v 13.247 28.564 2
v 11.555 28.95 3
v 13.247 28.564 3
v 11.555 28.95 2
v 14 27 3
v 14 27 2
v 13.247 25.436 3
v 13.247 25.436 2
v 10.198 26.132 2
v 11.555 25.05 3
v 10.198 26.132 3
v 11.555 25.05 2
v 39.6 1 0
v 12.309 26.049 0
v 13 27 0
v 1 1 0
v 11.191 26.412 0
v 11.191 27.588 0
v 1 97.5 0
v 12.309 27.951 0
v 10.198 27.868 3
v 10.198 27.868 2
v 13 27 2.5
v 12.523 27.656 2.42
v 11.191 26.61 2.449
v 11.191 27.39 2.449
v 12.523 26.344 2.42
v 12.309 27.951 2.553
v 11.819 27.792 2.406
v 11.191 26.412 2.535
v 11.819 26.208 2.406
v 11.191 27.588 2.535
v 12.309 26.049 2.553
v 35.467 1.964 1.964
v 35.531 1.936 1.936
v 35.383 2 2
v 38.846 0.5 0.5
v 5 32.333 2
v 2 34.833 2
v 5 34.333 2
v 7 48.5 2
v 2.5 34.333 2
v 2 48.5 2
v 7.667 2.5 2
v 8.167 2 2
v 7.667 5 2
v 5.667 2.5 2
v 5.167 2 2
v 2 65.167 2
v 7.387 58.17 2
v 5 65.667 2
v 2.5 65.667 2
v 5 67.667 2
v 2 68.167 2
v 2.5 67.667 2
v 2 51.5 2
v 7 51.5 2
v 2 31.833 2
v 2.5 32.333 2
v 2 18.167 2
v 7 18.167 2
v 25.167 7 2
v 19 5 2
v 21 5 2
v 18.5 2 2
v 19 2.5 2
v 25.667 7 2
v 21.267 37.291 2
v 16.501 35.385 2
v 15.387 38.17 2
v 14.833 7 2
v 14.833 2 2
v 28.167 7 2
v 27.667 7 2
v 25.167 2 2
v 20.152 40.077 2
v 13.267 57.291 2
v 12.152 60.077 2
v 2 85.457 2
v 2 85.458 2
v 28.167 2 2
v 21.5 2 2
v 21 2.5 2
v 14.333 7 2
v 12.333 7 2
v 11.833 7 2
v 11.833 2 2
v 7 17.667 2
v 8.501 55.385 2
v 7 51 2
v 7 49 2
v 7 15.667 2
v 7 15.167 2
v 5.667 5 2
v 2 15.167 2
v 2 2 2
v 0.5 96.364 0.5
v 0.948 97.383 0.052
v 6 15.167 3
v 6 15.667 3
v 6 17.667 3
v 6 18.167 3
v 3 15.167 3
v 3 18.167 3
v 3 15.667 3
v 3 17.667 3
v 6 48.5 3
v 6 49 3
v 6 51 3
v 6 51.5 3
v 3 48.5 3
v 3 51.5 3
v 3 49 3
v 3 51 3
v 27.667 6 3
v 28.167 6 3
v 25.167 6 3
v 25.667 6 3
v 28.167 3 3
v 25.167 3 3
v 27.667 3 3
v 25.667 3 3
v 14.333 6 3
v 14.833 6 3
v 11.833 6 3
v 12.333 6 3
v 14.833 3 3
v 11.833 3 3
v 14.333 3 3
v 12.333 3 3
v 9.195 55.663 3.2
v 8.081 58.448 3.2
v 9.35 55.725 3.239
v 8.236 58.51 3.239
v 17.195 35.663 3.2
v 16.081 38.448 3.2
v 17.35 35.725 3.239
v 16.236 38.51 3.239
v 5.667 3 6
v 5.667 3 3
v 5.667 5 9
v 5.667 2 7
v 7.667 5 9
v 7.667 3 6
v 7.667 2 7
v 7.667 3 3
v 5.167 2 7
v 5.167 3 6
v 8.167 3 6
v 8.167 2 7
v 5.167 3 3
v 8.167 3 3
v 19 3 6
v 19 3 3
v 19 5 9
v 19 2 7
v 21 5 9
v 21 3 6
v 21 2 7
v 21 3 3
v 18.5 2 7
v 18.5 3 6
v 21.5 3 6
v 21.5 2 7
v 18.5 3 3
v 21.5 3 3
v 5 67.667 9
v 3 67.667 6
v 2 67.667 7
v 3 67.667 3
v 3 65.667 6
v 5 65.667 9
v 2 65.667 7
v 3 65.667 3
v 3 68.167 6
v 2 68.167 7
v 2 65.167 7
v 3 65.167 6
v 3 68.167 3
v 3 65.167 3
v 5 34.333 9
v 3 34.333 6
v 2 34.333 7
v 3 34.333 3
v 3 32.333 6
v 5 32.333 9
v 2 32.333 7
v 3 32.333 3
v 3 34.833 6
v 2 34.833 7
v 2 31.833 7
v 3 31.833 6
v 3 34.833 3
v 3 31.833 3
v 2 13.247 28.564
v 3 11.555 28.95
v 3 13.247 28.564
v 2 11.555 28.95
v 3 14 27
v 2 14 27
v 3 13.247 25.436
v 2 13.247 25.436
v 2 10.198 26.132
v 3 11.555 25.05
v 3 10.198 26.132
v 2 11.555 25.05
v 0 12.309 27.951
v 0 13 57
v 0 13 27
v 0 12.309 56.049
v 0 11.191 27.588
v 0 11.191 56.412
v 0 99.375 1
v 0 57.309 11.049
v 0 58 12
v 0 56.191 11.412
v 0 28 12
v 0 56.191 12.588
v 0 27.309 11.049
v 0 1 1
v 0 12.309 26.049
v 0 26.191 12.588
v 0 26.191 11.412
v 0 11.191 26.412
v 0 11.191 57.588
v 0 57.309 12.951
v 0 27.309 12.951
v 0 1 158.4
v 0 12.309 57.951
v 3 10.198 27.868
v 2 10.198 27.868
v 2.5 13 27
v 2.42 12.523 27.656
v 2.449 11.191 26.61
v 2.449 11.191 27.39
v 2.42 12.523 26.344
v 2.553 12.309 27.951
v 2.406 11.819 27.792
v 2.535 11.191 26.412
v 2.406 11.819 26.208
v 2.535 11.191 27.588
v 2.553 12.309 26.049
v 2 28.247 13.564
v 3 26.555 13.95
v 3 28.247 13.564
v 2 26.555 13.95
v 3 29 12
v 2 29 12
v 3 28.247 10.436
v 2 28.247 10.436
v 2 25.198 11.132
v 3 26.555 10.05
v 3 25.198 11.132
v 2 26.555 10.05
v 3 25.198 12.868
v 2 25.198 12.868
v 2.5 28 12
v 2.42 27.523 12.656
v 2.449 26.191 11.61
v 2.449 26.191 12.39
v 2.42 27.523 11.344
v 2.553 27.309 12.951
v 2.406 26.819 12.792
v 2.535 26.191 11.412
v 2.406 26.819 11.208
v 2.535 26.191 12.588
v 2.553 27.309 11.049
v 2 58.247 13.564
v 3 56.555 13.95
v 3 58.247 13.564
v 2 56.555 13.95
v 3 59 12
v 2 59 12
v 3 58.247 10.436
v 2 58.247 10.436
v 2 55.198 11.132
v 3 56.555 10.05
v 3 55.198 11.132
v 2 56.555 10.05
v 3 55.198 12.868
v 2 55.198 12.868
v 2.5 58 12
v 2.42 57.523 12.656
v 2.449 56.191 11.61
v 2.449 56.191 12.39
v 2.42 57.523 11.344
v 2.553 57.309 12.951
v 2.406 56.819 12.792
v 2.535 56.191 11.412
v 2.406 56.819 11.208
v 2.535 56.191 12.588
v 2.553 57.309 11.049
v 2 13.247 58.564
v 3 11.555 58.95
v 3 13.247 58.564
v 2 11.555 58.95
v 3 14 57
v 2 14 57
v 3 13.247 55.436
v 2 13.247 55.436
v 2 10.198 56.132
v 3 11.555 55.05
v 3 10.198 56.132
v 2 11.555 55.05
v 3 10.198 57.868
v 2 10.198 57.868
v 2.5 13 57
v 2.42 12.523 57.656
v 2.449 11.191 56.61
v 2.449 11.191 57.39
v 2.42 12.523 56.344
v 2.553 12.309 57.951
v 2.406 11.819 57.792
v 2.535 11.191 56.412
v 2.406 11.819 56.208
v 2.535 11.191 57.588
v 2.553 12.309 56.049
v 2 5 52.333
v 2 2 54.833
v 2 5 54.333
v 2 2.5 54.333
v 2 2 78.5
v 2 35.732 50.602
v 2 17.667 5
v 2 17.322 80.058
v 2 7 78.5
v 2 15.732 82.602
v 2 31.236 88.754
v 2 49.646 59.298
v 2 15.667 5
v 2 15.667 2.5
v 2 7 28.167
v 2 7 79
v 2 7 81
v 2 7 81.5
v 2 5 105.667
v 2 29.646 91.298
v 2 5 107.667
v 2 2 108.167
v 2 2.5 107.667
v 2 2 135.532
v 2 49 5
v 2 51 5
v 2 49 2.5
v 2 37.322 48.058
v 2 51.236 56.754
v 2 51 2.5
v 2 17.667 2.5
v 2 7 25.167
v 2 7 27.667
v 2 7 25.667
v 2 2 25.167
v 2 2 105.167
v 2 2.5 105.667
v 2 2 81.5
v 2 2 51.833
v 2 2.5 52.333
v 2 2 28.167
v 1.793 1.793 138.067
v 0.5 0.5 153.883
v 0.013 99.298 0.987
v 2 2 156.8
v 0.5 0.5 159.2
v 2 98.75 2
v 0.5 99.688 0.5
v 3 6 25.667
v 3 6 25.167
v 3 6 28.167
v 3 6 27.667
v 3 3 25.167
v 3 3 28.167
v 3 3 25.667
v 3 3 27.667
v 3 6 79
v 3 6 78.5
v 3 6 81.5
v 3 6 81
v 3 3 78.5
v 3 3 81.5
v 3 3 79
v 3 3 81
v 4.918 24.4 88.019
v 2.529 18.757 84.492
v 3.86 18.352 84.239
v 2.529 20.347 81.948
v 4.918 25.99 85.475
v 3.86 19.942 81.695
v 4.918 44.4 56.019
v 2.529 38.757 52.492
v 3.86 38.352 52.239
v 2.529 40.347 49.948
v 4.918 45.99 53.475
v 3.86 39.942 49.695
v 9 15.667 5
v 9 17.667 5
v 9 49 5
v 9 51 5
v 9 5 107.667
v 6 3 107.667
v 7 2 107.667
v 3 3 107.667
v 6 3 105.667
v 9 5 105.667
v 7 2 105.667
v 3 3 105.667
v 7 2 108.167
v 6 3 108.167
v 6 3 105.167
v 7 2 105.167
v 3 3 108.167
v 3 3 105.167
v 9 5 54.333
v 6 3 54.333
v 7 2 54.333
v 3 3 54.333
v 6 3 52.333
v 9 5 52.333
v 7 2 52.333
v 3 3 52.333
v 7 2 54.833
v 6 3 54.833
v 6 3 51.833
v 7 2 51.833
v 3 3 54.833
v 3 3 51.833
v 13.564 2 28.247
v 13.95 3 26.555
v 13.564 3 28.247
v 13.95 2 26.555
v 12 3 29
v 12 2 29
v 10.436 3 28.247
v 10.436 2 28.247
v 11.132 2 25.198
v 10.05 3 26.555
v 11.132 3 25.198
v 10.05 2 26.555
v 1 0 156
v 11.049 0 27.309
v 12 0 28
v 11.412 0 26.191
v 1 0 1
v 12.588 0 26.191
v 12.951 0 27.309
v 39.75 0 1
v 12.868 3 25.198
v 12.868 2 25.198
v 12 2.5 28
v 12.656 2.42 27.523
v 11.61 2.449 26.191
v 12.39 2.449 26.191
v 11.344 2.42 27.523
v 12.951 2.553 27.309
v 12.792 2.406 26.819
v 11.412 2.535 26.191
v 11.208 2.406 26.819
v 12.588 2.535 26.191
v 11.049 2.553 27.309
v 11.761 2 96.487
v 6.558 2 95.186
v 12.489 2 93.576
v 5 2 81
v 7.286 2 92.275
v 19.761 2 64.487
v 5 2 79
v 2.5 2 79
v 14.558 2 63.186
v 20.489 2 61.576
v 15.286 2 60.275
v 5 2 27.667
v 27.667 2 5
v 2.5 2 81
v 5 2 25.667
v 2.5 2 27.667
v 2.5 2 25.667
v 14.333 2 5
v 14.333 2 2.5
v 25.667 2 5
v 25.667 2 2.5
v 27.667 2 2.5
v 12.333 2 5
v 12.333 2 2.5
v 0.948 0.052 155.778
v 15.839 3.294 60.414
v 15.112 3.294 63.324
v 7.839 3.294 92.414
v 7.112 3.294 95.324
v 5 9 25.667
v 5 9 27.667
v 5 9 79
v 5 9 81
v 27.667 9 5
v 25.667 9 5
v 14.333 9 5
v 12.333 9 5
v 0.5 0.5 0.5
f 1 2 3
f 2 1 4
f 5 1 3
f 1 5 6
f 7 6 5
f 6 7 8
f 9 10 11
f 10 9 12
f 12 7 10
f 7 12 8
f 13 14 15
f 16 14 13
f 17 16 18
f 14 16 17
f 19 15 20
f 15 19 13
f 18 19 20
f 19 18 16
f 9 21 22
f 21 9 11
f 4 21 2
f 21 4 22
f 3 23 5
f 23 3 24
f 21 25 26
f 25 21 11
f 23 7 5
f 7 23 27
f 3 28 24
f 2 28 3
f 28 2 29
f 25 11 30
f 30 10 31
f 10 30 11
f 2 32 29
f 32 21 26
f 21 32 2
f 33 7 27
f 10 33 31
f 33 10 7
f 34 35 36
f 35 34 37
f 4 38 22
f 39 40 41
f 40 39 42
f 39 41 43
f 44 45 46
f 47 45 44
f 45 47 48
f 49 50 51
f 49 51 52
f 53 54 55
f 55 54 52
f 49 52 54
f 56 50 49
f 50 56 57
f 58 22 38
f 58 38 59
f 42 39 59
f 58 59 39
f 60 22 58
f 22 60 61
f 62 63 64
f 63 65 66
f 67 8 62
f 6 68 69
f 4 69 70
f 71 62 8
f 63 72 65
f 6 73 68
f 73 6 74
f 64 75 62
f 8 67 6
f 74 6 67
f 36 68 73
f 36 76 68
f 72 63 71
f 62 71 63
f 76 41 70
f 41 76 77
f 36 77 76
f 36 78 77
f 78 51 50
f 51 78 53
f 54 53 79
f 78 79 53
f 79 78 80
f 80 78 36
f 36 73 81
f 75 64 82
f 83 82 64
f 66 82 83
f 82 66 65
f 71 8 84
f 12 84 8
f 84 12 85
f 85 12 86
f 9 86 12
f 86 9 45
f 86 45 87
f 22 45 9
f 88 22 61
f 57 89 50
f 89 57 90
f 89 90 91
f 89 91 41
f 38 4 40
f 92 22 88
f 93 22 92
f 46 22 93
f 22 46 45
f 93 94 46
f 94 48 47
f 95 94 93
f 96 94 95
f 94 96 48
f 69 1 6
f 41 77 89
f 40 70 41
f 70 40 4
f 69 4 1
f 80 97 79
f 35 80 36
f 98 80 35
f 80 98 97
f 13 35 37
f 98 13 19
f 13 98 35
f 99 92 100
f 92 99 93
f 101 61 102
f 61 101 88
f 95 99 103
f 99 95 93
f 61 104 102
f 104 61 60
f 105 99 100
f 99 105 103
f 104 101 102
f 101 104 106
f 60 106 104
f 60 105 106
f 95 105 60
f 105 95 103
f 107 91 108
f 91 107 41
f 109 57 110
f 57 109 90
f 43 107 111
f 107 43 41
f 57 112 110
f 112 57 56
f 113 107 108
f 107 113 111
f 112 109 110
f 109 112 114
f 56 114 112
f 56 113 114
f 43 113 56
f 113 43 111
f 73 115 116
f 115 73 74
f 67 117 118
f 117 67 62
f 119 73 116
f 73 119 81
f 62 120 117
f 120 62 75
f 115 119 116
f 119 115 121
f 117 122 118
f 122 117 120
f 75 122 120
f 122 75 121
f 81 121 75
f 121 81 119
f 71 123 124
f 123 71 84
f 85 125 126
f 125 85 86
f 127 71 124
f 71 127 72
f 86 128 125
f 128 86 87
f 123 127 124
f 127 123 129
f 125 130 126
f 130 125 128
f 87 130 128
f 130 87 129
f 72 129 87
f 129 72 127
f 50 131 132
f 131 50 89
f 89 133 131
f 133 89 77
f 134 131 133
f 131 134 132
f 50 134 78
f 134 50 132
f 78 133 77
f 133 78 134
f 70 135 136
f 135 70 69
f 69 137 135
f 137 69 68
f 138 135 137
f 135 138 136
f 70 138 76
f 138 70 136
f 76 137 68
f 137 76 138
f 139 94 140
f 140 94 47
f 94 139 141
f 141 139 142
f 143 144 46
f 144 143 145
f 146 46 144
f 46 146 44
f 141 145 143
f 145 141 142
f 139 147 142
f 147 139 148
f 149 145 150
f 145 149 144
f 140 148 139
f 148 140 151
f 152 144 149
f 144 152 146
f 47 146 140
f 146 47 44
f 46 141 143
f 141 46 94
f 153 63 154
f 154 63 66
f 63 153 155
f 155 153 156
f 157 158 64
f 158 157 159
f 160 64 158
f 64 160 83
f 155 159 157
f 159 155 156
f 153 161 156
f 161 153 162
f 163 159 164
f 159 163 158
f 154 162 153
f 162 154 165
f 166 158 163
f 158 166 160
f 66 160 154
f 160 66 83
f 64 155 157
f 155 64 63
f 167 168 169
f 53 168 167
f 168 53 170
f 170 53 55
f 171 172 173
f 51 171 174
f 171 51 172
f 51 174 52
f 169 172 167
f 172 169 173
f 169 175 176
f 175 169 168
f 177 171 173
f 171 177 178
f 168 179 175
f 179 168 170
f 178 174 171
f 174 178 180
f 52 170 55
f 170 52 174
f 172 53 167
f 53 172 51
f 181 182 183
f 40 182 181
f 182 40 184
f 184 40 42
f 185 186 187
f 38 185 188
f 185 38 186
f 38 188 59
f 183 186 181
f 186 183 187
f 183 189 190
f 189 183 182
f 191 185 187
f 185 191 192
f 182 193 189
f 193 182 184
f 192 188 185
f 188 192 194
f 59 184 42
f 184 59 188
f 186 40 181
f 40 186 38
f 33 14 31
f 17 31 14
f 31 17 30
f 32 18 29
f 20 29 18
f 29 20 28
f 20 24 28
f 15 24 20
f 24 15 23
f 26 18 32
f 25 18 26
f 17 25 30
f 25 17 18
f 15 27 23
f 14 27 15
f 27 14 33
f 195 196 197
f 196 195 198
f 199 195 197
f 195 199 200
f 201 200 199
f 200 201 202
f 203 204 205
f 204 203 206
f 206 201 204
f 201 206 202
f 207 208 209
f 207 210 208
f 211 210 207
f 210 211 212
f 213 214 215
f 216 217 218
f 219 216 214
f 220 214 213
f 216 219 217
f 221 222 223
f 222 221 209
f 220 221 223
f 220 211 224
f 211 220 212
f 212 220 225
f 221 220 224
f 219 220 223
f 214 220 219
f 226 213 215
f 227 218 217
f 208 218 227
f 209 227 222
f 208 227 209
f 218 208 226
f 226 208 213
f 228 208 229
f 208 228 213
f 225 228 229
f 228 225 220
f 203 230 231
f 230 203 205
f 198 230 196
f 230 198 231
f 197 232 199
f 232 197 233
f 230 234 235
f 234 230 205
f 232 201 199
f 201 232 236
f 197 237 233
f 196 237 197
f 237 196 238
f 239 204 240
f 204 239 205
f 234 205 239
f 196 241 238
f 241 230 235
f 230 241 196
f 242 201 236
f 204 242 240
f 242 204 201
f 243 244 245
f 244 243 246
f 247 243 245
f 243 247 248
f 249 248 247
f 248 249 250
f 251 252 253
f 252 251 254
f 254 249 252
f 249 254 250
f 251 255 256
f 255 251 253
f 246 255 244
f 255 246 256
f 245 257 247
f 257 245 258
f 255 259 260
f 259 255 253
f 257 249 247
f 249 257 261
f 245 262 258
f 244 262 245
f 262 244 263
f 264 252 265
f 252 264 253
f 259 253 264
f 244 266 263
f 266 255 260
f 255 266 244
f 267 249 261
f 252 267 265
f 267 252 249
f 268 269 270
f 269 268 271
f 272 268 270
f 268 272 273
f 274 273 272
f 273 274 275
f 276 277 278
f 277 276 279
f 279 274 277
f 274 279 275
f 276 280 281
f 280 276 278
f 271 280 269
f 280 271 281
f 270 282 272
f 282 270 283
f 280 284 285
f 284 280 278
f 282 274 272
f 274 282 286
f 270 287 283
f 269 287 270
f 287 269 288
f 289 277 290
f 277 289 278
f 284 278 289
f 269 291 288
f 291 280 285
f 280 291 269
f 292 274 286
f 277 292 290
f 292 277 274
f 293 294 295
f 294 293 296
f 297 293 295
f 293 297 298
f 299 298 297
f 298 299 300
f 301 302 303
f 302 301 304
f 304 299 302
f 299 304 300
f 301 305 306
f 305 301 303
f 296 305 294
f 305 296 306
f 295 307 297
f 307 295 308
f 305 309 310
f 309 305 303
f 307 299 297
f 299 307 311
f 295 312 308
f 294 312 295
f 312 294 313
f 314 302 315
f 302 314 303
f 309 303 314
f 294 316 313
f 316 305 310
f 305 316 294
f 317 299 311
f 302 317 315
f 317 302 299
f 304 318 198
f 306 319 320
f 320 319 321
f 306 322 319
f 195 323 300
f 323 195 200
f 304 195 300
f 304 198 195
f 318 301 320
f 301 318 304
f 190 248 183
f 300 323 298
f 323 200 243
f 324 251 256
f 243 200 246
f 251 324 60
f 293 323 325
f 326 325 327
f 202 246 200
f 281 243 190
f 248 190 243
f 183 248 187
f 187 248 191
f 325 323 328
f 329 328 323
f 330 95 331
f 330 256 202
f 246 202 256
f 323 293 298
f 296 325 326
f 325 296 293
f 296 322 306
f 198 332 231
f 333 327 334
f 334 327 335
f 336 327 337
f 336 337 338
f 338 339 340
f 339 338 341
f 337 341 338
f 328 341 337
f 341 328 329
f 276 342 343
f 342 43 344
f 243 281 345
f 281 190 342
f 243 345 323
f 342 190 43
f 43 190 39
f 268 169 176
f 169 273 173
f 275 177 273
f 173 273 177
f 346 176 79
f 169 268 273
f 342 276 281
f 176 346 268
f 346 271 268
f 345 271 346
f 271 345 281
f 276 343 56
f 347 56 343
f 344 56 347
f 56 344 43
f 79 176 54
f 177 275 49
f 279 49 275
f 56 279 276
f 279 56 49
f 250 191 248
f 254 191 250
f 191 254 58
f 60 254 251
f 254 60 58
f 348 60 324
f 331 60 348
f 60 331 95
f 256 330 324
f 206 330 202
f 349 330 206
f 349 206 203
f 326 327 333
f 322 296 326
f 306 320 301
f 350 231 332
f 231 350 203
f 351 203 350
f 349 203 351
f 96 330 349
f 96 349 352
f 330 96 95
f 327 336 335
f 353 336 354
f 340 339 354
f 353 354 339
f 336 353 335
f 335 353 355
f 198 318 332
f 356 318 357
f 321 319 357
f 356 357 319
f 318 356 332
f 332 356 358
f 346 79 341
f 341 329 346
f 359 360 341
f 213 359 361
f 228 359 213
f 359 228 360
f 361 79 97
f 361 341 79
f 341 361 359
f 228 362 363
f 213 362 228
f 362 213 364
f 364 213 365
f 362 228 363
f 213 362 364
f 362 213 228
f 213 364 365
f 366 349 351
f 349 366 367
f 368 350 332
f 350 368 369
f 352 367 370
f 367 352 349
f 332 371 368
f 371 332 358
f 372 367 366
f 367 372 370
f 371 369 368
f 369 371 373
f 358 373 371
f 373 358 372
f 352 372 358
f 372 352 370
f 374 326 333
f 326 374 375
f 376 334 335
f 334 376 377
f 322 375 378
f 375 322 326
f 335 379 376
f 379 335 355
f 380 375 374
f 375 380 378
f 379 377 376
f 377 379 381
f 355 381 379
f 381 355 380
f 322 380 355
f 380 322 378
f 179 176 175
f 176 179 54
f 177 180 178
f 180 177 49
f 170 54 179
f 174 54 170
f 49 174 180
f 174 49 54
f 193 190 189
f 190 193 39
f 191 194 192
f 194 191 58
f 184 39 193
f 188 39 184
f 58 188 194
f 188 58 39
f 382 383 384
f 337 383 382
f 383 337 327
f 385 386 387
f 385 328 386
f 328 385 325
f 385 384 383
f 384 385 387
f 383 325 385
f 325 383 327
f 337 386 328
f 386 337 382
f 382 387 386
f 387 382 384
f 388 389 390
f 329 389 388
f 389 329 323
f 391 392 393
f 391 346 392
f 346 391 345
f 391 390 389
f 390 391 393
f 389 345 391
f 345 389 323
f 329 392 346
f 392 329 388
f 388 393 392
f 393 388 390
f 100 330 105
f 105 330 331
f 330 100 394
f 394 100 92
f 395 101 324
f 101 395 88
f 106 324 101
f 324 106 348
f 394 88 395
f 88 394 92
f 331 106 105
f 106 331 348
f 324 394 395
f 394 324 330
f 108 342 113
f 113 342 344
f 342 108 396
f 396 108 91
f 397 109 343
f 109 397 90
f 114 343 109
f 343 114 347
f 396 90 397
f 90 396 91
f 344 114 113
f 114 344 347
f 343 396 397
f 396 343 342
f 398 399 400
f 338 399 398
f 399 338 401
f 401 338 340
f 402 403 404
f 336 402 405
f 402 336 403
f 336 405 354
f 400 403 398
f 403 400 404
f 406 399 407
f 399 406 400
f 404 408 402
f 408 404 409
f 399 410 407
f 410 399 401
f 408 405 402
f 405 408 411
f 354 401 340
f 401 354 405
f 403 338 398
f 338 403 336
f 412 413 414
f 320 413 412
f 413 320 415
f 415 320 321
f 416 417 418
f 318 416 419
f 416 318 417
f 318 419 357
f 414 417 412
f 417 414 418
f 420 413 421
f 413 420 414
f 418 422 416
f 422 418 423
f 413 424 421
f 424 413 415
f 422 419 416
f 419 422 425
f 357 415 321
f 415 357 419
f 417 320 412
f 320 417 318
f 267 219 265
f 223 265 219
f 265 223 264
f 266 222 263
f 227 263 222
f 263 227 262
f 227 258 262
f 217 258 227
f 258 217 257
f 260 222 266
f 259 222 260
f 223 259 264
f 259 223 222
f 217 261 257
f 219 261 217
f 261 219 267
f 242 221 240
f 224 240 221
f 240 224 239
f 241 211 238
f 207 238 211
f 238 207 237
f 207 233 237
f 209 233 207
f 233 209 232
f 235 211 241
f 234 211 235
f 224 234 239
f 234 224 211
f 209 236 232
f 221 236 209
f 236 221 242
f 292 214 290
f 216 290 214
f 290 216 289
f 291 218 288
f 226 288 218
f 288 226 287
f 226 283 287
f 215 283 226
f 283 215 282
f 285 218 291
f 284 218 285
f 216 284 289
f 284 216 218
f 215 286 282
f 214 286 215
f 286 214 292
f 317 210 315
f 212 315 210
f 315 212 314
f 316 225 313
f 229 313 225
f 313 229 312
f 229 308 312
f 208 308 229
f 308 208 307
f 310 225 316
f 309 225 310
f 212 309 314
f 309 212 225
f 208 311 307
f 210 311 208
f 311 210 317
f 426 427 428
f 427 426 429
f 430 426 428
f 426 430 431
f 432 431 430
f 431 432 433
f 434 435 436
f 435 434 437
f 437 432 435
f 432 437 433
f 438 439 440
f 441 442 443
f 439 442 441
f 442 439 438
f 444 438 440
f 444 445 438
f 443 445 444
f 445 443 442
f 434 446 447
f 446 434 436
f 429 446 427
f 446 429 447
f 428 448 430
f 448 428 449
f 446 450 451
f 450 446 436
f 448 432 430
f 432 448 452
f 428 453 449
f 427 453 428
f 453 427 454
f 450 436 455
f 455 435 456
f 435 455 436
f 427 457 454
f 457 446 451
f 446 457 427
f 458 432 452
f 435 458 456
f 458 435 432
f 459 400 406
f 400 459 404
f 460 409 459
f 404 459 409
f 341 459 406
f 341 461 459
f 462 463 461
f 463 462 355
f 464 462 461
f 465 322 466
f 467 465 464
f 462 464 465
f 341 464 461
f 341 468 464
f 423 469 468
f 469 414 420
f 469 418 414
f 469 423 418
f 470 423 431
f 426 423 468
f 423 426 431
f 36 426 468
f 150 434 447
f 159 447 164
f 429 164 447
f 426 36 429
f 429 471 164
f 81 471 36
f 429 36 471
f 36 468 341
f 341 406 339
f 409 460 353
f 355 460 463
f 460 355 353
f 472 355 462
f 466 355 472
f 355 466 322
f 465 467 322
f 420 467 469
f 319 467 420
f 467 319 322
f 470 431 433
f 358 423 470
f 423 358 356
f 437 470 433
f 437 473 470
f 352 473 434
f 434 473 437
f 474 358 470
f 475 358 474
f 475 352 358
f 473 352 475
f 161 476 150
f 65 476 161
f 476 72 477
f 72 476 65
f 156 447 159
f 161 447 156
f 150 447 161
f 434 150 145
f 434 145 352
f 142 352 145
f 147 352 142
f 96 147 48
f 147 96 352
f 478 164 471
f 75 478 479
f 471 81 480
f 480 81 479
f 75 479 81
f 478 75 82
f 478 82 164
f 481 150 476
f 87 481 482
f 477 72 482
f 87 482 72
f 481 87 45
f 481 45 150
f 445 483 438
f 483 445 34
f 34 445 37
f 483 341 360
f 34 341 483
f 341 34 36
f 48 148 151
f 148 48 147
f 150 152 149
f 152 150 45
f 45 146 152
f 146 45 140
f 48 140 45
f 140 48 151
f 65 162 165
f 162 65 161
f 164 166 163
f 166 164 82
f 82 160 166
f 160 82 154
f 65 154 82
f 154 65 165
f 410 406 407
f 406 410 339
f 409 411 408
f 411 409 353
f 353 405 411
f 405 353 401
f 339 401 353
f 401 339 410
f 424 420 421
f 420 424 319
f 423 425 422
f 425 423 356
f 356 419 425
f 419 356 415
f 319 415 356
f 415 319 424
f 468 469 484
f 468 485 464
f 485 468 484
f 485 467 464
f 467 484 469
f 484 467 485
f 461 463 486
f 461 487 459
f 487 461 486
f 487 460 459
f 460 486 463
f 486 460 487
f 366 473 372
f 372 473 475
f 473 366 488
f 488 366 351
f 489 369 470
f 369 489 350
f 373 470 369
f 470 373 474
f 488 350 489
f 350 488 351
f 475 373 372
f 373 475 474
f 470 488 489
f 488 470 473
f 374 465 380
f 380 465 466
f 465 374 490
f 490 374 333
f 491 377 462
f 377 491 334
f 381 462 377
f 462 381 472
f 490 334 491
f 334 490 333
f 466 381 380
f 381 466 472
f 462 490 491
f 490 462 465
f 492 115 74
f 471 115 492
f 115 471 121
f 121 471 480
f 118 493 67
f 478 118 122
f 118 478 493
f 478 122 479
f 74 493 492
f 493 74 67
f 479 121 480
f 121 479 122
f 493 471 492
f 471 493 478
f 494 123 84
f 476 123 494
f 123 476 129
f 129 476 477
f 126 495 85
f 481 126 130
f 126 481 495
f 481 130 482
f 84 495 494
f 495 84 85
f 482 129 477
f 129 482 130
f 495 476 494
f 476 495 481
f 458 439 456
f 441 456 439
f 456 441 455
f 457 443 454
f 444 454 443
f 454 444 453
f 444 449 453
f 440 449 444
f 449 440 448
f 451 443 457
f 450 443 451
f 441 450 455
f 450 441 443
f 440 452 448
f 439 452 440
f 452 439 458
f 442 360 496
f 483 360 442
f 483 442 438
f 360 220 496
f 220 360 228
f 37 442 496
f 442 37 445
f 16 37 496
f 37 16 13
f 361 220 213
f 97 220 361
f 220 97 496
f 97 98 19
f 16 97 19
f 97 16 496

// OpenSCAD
// This code builds a box with three arbitrary sides that fits into the corner of a room. You can add arbitrary holes for a cable (wall panels) or some sensors (room side). The wall panels are identical if the side lengths are. Wall-to-wall edges can be mitered because wall corners often are. Miter depth is measured along the wall and can be > the box thickness. The miter angle is always 45°.

// All measurements are in mm.

// side lengths
side_x = 40;
side_y = 100;
side_z = 160;
edge_miter = 1; // TODO

// thickness of walls.
wall_side = 2;
wall_top = 3;

// add mounting holes? at most n per side. They start in the corner and extend until there are either n/2 on a side or they get too close to the edge. NB: there's no collision check of holes vs. hooks!
n_holes = 4;
hole_inner = 2; // bore diameter
hole_outer = 4; // ring
hole_height = 1;
hole_inner_sink = 1; // slant
hole_edge = 10; // distance from the edge
hole_offset = 30; // distance between holes

// separation between pieces when printing
delta = 5;

/*
 * The pieces are joined with some fancy hooks, the parameters for which require some explaining.

This is the groove which the hook joins:
 
     |   |
     |   |
     |   |
     |   | /- here is where the tip ends up at
    /    | -- hook_edge
    |    | -- hook_len
     \   | -- the part's edge is extended until it is hook_len high
      \  |
       \/  -- 1/2 miter

The top/side joins are <90° so this will be slanted to the left.

The hook, below, moves up and joins with the groove:
     /---- the top of the hook
 |\  ----- height: hook_head
 | \ /---- the tip of the hook
 | / ----- height: hook_edge
 | | ----- height: hook_len-hook_base
/ _|_----- height: hook_base
     \
      \
       \
_______/ - 1/2 miter
^ ^ ^ 
| |  \---- width: hook_edge_depth
|  \------ width: hook_depth
 \-------- width: hook_base_depth

For the top/side joins this will move to the left appropriately.

The hook shall be auto-placed so that it (a) meets with the groove and (b) isn't cut off by the miter.

hook_edge must be smaller than hook_edge_depth, otherwise the sides can just slide apart. This is not a problem with the top. TODO allow different parameters for it.

*/
n_hooks = 2; // per edge, evenly spaced.
hook_width = 2; // extrusion of the hook
groove_width = 3; // extrusion of the groove

hook_depth = 2;
hook_edge_depth = 1;
hook_head = 2;
hook_edge = 1;
hook_len = 4;
hook_base = 1;
hook_base_depth = 0.5;

HOOKS = [n_hooks,hook_width,groove_width,hook_depth,hook_edge_depth,hook_head,hook_edge,hook_len,hook_base,hook_base_depth];

// Customizeable hooks. The basic lookup function just uses the same hook style everywhere.
function hc(n,c) = HOOKS[c];
N_HOOKS=0;
H_WIDTH=1;
H_G_WIDTH=2;
H_DEPTH=3;
H_EDGE_DEPTH=4;
H_HEAD=5;
H_EDGE=6;
H_LEN=7;
H_BASE=8;
H_BASE_DEPTH=9;

// don't change below this point

// first, some common trig formulae

function distance(a,b) = sqrt(a*a+b*b);

// Two circles of radius a and b, centered at (0,0) and (c,0), meet at (x,y):
function circle_intersect_x(a,c,b) = (a*a+c*c-b*b)/2/c;
function circle_intersect_y(a,x) = sqrt(a*a-x*x);

// all arrays are duplicated to avoid mod() when indexing with an offset

// arbitrary ordering so that side_x/side_y is at +x/+y when flattened.
// (z-axis ends up at -y, the y edge is mirrored to -x
//  the top of the box is in the -x/+y quadrant)
// This continues in the rest of the code: think of index zero as the Z axis
// or as referring to the XY-triangle that's perpendicular to it.
// Same for the other axes of course.

axes = [side_z,side_x,side_y,
        side_z,side_x,side_y,
        side_z,side_x,side_y]; 

// The edges are numbered so that edge N doesn't touch axis N
function _edge(n) = distance(axes[n+1], axes[n+2]);
edges = [_edge(0),_edge(1),_edge(2),
         _edge(0),_edge(1),_edge(2),
         _edge(0),_edge(1),_edge(2)];

// internal angles of side triangle n on the side in common with n+1
function side_angle(n) = atan2(axes[n+1], axes[n+2]);
angles1 = [side_angle(0),side_angle(1),side_angle(2),
           side_angle(0),side_angle(1),side_angle(2),
           side_angle(0),side_angle(1),side_angle(2)];

// The corners of the top plate, when it lies flat, are at X=(0,0) Z=(edge_y,0) Y=(x2,y2)
// yes this is the wrong way 'round, but that is intentional because you need to flip the lid when you put it on top of the box
x2=circle_intersect_x(edges[0],edges[2],edges[1]);
y2=circle_intersect_y(edges[0],x2);

// Heights of side triangles. Again, height vector N is perpendicular to axis N.
function _height(n) = sin(angles1[n]) * axes[n+2];
heights = [_height(0),_height(1),_height(2),
           _height(0),_height(1),_height(2),
           _height(0),_height(1),_height(2)];

// internal angle of the top plate against side N
function top_angle(n) = atan2(axes[n], heights[n]);
angles2 = [top_angle(0),top_angle(1),top_angle(2),
           top_angle(0),top_angle(1),top_angle(2),
           top_angle(0),top_angle(1),top_angle(2)];

// The edge to remove from wall N+1 so that it meets wall N-1 halfway,
// which can be rotated so that it's also the edge to remove from N-1
// to meet N+1 halfway, which is why there's only one chamfer1 module.
module chamfer1(n) {
    translate([0,0,wall_side])
        rotate(a=[0,90,0])
            linear_extrude(height=axes[n], center=false) 
                polygon([[0,0],[wall_side,0],[0,wall_side]]);
}

// A wall with thickness B merges with a wall with thickness A at angle Alpha
// so that their outer edges coincide. Calculate the angle Gamma (with 0<Gamma<Alpha)
// required to chamfer the edge of B so that the walls' inner edges also meet.
// (Verifying this formula is left as an exercise for the reader.)
function angle_c(alpha,a,b) = atan2(b, a/sin(alpha)+b/tan(alpha));

// The edge to remove from side N so that it meets the top halfway
module chamfer2(n) {
    ac = angle_c(angles2[n+2], wall_top, wall_side);

    translate([0,axes[n+1],wall_side])
        rotate([0,0,angles1[n+2]+180])
            rotate([-90,0,0])
                linear_extrude(height=edges[n+2], center=false) 
                    polygon([[0,0],[wall_side/tan(ac),0],[0,wall_side]]);
}

// The three chamfer edges of a side
module chamfer_side(n) {
    union() {
        chamfer1(n);
        translate([wall_side,0,wall_side]) rotate([-90,0,90]) chamfer1(n+1);
        chamfer2(n);
    }
}

// The edge to remove from the top so that it meets wall N halfway
module chamfer3(n) {
    ac = angle_c(angles2[n], wall_side, wall_top);
    rotate([0,90,0])
        linear_extrude(height=edges[n], center=false)
            polygon([[0,0],[-wall_top,0],[-wall_top,wall_top/tan(ac)]]);
}

// calculate the internal angle of the top triangle at corner N
// (also left as an exercise …)
function angle3(n) = acos((edges[n+1]*edges[n+1]+edges[n+2]*edges[n+2]-edges[n]*edges[n])/2/edges[n+1]/edges[n+2]);

// The three chamfer edges of the top
module chamfer_top() {
    union() {
        chamfer3(2); // the Y edge of the top plate lies along the x axis. See "corners of the top plate", above
        translate([x2,y2,0]) rotate([0,0,180+angle3(1)]) chamfer3(0);
        translate([edges[2],0,0]) rotate([0,0,180-angle3(0)]) chamfer3(1);
    }
}



// ***** Here's where we build our joints. ******

// polygon for the hook. n-1: edge-to-edge, else edge-to-top
module poly_hook(n) {
    a_hook = atan2(hc(n,H_HEAD), hc(n,H_DEPTH)+hc(n,H_EDGE_DEPTH));
    a_wall = (n<0) ? 90 : angles2[n];
    a_chamfer = (n<0) ? 45 : angle_c(angles2[n], wall_top, wall_side);

    y_tip = hc(n,H_LEN)+hc(n,H_EDGE);
    y_top = hc(n,H_LEN)+hc(n,H_EDGE)+hc(n,H_HEAD);

    // if a_hook > a_wall, the wall is too flat and we need to start with the hook's top
    x_top = (a_hook > a_wall) ? y_top/tan(a_wall) : y_tip/tan(a_wall)+hc(n,H_EDGE_DEPTH)+hc(n,H_DEPTH);
    x_tip = (a_hook > a_wall) ? y_top/tan(a_wall)-hc(n,H_EDGE_DEPTH)-hc(n,H_DEPTH) : y_tip/tan(a_wall);

    x_edge = x_tip+hc(n,H_EDGE_DEPTH);
    y_edge = y_tip-hc(n,H_EDGE);

    // base towards the center
    // polygon([[x_top,y_top], [x_tip,y_tip], [x_edge,y_edge], [x_edge,0], [x_edge+hook_depth+hc(n,H_BASE_DEPTH),0], [x_tip,hc(n,H_BASE)]]);
    // base towards the edge
    polygon([[x_top,y_top], [x_tip,y_tip], [x_edge,y_edge], [x_edge,hc(n,H_BASE)], [x_edge-hc(n,H_BASE_DEPTH),0], [x_edge+hc(n,H_DEPTH),0]]);

}

// polygon for the hook's groove. n-1: edge-to-edge, else edge-to-top
module poly_hook_groove(n) {
    a_hook = atan2(hc(n,H_HEAD), hc(n,H_DEPTH)+hc(n,H_EDGE_DEPTH));
    a_wall = (n<0) ? 90 : angles2[n];
    a_chamfer = (n<0) ? 45 : angle_c(angles2[n], wall_top, wall_side);

    y_tip = hc(n,H_LEN)+hc(n,H_EDGE);
    y_top = hc(n,H_LEN)+hc(n,H_EDGE)+hc(n,H_HEAD);

    if (a_hook > a_wall) { // wall too flat, need additional offset
        x_top = y_top/tan(a_wall);
        x_tip = x_top-hc(n,H_EDGE_DEPTH)-hc(n,H_DEPTH);
        x_edge = x_tip+hc(n,H_EDGE_DEPTH);
        y_edge = y_tip-hc(n,H_EDGE);
        x_base = x_edge - y_edge / tan(a_hook);
        rotate(atan2(x_top,y_top))
        polygon([[x_top,y_top],[x_tip,y_tip],  [x_edge,y_edge], [x_base,0], [0,0]]);
    } else { // simple case
        x_tip = y_tip*tan(90-a_wall); // avoid dividing by infinity
        x_edge = x_tip+hc(n,H_EDGE_DEPTH);
        y_edge = y_tip-hc(n,H_EDGE);
    
        // start at tip, counterclockwisewall_top*cos(angles2[n])
        rotate(atan2(x_tip,y_tip))
        if (x_edge/tan(a_chamfer) > y_edge)
            polygon([[x_tip,y_tip], [x_edge,y_edge], [0,0]]);
        else
            polygon([[x_tip,y_tip], [x_edge,y_edge], [x_edge,x_edge/tan(a_chamfer)], [0,0]]);

    }
}


module grooves_wall(n,off=0) {
    for(x=[1:2:2*hc(-1-n,N_HOOKS)]) translate([0,0,axes[n]*(x+off)/2/(hc(-1-n,N_HOOKS)+1)])
        linear_extrude(hc(-1-n,H_G_WIDTH), center=true)
            poly_hook_groove(-1-n);
}

module grooves_edge(n,off=0) {
    for(x=[1:hc(n,N_HOOKS)]) translate([0,0,edges[n]*(x+1)/(hc(n,N_HOOKS)+3)])
        linear_extrude(hc(n,H_G_WIDTH), center=true)
            poly_hook_groove(n);
}

module hooks_wall(n, off=0) {
    for(x=[1:2:2*hc(-1-n,N_HOOKS)]) translate([0,0,axes[n]*(x+off)/2/(hc(-1-n,N_HOOKS)+1)])
        linear_extrude(hc(-1-n,H_WIDTH), center=true)
            poly_hook(-1-n);
}

module hooks_edge(n) {
    a_chamfer = angle_c(angles2[n], wall_side,wall_top);
    rotate([0,90,0]) rotate(90)
    translate([wall_top/tan(a_chamfer),wall_top,0])
    for(x=[1:hc(n,N_HOOKS)]) translate([0,0,edges[n]*(x+1)/(hc(n,N_HOOKS)+3)])
        linear_extrude(hc(n,H_WIDTH), center=true)
            poly_hook(n);
}

// the actual hole, slightly larger so that preview sees it
module hole_bore() {
    translate([0,0,-0.5]) cylinder(h=hole_height+wall_side+1,d=hole_inner);
}

// an inward-slanted ring on the hole, for stability when screwing
module hole_ring() {
    difference() {
        cylinder(h=hole_height+wall_side,d=hole_outer);
        translate([0,0,wall_side+hole_height-hole_inner_sink]) cylinder(h=hole_inner_sink,d1=0,d2=hole_outer);
    }
}

// Position the holes.
module hole_pos(n) {
    // Start position
    inner = hole_edge+wall_side;
    
    // how close to the lid edge may we get?
    c_offset=wall_side/tan(angle_c(angles2[n], wall_top, wall_side))+hole_edge;
    
    // Here we figure the corresponding max offsets. The first subtracted term gets us to the place we'd be if the holes were at the outer edge, but of course they aren't.
    lim_1 = axes[n+1] - c_offset / sin(90-angles1[n]) - inner*tan(angles1[n]);
    lim_2 = axes[n+2] - c_offset / sin(angles1[n]) - inner/tan(angles1[n]);

    // if there's an even number of holes, shift them to be halfway between the places they'd be if there was an odd number.
    union() {
        if (n_holes%2) translate([inner,inner,0]) children();
        for (x=[1:n_holes/2]) {
            offset=(x-(1-n_holes%2)/2)*hole_offset+inner;
            if (offset <= lim_1) translate([offset,inner,0]) children();
            if (offset <= lim_2) translate([inner,offset,0]) children();
        }
    }
}

module make_holes(n) {
    difference() {
        union() {
            hole_pos(n) hole_ring();
        
            children();
        }
        hole_pos(n) hole_bore();
    }
}

module side(n) {
    a_chamfer = angle_c(angles2[n], wall_top, wall_side);

    union() {
        difference() {
            linear_extrude(height=wall_side, center=false) 
                polygon([[0,0],[axes[n+1],0],[0,axes[n+2]]]);
            chamfer_side(n+1);
        }
        
        translate([wall_side,0,wall_side]) rotate([0,-90,-90]) grooves_wall(n+2);
        translate([axes[n+1],wall_side,wall_side]) rotate([-90,-90,90]) grooves_wall(n+1,1);
        
        // Yes this can be simplified, but then it'll be unreadable.
        translate([0,axes[n+2],wall_side]) rotate(angles1[n]-90) translate([0,-wall_side/tan(a_chamfer),0]) rotate([0,90,0]) rotate([0,0,180]) grooves_edge(n);
        translate([0,wall_side,wall_side]) rotate([0,90,0]) rotate([0,0,90])        hooks_wall(n+1);
        translate([wall_side,axes[n+2],wall_side]) rotate([90,0,0]) hooks_wall(n+2,1);
    }
}

// rotate side N to move to N+1
module to_next_side() {
    rotate([90,0,0]) rotate([0,90,0]) children();
}

// One outer edge chamfer.
module mitered_edge(n) {
    //translate([0,0,wall_side])
            linear_extrude(height=axes[n], center=false) 
                polygon([[0,0],[edge_miter,0],[0,edge_miter]]);
}

module mitered_edges() {
    mitered_edge(0);
    to_next_side() mitered_edge(1);
    to_next_side() to_next_side() mitered_edge(2);
}

// show all sides where they belong
module uncut_sides() {
    make_holes(0) side(0);
    to_next_side() color("red") make_holes(1) side(1);
    to_next_side() to_next_side() color("green") make_holes(2) side(2);
}

module sides() {
    difference() {
        uncut_sides();
        mitered_edges();
    }
}

// move the top to where it belongs
module to_top() {
    translate([axes[1],0,0])
        rotate(-180+angles2[0], v=[-axes[1],axes[2],0])
            rotate(90-angle3(1)+angles1[0])
                children();
}

// invert to_top. Required for the outer edge chamfer.
module from_top() {
    rotate(angle3(1)-angles1[0]-90)
    rotate(180-angles2[0], v=[-axes[1],axes[2],0])
    translate([-axes[1],0,0])
    children();
}

// the top piece
module uncut_top() {
    union() {
        difference() {
            linear_extrude(height=wall_top, center=false) 
                polygon([[0,0],[edges[2],0],[x2,y2]]);
            chamfer_top();
    
        }
        hooks_edge(2);
        translate([x2,y2,0]) rotate([0,0,180+angle3(1)]) hooks_edge(0);
        translate([edges[2],0,0]) rotate([0,0,180-angle3(0)]) hooks_edge(1);
   }
}

// cut the mitered corners off the top edge. The math to do that is annoyingly complicated, so I simply reverse the transform that puts the top onto the box.
module top() {
    difference() {
        uncut_top();
        from_top() mitered_edges();
    }
}

module box() {
    union() {
        sides();
        to_top() top();
    }
}

module flat() {
    translate([delta/2,-delta/2,0]) rotate(270)  side(1);
    translate([delta/2,delta/2,0]) side(2);
    translate([-delta/2,-delta/2,0]) rotate(180) side(0);
    translate([-edges[2]-delta/2,delta/2,0]) top();
}


//top();
//side(0);
sides();
//box();
//flat();
